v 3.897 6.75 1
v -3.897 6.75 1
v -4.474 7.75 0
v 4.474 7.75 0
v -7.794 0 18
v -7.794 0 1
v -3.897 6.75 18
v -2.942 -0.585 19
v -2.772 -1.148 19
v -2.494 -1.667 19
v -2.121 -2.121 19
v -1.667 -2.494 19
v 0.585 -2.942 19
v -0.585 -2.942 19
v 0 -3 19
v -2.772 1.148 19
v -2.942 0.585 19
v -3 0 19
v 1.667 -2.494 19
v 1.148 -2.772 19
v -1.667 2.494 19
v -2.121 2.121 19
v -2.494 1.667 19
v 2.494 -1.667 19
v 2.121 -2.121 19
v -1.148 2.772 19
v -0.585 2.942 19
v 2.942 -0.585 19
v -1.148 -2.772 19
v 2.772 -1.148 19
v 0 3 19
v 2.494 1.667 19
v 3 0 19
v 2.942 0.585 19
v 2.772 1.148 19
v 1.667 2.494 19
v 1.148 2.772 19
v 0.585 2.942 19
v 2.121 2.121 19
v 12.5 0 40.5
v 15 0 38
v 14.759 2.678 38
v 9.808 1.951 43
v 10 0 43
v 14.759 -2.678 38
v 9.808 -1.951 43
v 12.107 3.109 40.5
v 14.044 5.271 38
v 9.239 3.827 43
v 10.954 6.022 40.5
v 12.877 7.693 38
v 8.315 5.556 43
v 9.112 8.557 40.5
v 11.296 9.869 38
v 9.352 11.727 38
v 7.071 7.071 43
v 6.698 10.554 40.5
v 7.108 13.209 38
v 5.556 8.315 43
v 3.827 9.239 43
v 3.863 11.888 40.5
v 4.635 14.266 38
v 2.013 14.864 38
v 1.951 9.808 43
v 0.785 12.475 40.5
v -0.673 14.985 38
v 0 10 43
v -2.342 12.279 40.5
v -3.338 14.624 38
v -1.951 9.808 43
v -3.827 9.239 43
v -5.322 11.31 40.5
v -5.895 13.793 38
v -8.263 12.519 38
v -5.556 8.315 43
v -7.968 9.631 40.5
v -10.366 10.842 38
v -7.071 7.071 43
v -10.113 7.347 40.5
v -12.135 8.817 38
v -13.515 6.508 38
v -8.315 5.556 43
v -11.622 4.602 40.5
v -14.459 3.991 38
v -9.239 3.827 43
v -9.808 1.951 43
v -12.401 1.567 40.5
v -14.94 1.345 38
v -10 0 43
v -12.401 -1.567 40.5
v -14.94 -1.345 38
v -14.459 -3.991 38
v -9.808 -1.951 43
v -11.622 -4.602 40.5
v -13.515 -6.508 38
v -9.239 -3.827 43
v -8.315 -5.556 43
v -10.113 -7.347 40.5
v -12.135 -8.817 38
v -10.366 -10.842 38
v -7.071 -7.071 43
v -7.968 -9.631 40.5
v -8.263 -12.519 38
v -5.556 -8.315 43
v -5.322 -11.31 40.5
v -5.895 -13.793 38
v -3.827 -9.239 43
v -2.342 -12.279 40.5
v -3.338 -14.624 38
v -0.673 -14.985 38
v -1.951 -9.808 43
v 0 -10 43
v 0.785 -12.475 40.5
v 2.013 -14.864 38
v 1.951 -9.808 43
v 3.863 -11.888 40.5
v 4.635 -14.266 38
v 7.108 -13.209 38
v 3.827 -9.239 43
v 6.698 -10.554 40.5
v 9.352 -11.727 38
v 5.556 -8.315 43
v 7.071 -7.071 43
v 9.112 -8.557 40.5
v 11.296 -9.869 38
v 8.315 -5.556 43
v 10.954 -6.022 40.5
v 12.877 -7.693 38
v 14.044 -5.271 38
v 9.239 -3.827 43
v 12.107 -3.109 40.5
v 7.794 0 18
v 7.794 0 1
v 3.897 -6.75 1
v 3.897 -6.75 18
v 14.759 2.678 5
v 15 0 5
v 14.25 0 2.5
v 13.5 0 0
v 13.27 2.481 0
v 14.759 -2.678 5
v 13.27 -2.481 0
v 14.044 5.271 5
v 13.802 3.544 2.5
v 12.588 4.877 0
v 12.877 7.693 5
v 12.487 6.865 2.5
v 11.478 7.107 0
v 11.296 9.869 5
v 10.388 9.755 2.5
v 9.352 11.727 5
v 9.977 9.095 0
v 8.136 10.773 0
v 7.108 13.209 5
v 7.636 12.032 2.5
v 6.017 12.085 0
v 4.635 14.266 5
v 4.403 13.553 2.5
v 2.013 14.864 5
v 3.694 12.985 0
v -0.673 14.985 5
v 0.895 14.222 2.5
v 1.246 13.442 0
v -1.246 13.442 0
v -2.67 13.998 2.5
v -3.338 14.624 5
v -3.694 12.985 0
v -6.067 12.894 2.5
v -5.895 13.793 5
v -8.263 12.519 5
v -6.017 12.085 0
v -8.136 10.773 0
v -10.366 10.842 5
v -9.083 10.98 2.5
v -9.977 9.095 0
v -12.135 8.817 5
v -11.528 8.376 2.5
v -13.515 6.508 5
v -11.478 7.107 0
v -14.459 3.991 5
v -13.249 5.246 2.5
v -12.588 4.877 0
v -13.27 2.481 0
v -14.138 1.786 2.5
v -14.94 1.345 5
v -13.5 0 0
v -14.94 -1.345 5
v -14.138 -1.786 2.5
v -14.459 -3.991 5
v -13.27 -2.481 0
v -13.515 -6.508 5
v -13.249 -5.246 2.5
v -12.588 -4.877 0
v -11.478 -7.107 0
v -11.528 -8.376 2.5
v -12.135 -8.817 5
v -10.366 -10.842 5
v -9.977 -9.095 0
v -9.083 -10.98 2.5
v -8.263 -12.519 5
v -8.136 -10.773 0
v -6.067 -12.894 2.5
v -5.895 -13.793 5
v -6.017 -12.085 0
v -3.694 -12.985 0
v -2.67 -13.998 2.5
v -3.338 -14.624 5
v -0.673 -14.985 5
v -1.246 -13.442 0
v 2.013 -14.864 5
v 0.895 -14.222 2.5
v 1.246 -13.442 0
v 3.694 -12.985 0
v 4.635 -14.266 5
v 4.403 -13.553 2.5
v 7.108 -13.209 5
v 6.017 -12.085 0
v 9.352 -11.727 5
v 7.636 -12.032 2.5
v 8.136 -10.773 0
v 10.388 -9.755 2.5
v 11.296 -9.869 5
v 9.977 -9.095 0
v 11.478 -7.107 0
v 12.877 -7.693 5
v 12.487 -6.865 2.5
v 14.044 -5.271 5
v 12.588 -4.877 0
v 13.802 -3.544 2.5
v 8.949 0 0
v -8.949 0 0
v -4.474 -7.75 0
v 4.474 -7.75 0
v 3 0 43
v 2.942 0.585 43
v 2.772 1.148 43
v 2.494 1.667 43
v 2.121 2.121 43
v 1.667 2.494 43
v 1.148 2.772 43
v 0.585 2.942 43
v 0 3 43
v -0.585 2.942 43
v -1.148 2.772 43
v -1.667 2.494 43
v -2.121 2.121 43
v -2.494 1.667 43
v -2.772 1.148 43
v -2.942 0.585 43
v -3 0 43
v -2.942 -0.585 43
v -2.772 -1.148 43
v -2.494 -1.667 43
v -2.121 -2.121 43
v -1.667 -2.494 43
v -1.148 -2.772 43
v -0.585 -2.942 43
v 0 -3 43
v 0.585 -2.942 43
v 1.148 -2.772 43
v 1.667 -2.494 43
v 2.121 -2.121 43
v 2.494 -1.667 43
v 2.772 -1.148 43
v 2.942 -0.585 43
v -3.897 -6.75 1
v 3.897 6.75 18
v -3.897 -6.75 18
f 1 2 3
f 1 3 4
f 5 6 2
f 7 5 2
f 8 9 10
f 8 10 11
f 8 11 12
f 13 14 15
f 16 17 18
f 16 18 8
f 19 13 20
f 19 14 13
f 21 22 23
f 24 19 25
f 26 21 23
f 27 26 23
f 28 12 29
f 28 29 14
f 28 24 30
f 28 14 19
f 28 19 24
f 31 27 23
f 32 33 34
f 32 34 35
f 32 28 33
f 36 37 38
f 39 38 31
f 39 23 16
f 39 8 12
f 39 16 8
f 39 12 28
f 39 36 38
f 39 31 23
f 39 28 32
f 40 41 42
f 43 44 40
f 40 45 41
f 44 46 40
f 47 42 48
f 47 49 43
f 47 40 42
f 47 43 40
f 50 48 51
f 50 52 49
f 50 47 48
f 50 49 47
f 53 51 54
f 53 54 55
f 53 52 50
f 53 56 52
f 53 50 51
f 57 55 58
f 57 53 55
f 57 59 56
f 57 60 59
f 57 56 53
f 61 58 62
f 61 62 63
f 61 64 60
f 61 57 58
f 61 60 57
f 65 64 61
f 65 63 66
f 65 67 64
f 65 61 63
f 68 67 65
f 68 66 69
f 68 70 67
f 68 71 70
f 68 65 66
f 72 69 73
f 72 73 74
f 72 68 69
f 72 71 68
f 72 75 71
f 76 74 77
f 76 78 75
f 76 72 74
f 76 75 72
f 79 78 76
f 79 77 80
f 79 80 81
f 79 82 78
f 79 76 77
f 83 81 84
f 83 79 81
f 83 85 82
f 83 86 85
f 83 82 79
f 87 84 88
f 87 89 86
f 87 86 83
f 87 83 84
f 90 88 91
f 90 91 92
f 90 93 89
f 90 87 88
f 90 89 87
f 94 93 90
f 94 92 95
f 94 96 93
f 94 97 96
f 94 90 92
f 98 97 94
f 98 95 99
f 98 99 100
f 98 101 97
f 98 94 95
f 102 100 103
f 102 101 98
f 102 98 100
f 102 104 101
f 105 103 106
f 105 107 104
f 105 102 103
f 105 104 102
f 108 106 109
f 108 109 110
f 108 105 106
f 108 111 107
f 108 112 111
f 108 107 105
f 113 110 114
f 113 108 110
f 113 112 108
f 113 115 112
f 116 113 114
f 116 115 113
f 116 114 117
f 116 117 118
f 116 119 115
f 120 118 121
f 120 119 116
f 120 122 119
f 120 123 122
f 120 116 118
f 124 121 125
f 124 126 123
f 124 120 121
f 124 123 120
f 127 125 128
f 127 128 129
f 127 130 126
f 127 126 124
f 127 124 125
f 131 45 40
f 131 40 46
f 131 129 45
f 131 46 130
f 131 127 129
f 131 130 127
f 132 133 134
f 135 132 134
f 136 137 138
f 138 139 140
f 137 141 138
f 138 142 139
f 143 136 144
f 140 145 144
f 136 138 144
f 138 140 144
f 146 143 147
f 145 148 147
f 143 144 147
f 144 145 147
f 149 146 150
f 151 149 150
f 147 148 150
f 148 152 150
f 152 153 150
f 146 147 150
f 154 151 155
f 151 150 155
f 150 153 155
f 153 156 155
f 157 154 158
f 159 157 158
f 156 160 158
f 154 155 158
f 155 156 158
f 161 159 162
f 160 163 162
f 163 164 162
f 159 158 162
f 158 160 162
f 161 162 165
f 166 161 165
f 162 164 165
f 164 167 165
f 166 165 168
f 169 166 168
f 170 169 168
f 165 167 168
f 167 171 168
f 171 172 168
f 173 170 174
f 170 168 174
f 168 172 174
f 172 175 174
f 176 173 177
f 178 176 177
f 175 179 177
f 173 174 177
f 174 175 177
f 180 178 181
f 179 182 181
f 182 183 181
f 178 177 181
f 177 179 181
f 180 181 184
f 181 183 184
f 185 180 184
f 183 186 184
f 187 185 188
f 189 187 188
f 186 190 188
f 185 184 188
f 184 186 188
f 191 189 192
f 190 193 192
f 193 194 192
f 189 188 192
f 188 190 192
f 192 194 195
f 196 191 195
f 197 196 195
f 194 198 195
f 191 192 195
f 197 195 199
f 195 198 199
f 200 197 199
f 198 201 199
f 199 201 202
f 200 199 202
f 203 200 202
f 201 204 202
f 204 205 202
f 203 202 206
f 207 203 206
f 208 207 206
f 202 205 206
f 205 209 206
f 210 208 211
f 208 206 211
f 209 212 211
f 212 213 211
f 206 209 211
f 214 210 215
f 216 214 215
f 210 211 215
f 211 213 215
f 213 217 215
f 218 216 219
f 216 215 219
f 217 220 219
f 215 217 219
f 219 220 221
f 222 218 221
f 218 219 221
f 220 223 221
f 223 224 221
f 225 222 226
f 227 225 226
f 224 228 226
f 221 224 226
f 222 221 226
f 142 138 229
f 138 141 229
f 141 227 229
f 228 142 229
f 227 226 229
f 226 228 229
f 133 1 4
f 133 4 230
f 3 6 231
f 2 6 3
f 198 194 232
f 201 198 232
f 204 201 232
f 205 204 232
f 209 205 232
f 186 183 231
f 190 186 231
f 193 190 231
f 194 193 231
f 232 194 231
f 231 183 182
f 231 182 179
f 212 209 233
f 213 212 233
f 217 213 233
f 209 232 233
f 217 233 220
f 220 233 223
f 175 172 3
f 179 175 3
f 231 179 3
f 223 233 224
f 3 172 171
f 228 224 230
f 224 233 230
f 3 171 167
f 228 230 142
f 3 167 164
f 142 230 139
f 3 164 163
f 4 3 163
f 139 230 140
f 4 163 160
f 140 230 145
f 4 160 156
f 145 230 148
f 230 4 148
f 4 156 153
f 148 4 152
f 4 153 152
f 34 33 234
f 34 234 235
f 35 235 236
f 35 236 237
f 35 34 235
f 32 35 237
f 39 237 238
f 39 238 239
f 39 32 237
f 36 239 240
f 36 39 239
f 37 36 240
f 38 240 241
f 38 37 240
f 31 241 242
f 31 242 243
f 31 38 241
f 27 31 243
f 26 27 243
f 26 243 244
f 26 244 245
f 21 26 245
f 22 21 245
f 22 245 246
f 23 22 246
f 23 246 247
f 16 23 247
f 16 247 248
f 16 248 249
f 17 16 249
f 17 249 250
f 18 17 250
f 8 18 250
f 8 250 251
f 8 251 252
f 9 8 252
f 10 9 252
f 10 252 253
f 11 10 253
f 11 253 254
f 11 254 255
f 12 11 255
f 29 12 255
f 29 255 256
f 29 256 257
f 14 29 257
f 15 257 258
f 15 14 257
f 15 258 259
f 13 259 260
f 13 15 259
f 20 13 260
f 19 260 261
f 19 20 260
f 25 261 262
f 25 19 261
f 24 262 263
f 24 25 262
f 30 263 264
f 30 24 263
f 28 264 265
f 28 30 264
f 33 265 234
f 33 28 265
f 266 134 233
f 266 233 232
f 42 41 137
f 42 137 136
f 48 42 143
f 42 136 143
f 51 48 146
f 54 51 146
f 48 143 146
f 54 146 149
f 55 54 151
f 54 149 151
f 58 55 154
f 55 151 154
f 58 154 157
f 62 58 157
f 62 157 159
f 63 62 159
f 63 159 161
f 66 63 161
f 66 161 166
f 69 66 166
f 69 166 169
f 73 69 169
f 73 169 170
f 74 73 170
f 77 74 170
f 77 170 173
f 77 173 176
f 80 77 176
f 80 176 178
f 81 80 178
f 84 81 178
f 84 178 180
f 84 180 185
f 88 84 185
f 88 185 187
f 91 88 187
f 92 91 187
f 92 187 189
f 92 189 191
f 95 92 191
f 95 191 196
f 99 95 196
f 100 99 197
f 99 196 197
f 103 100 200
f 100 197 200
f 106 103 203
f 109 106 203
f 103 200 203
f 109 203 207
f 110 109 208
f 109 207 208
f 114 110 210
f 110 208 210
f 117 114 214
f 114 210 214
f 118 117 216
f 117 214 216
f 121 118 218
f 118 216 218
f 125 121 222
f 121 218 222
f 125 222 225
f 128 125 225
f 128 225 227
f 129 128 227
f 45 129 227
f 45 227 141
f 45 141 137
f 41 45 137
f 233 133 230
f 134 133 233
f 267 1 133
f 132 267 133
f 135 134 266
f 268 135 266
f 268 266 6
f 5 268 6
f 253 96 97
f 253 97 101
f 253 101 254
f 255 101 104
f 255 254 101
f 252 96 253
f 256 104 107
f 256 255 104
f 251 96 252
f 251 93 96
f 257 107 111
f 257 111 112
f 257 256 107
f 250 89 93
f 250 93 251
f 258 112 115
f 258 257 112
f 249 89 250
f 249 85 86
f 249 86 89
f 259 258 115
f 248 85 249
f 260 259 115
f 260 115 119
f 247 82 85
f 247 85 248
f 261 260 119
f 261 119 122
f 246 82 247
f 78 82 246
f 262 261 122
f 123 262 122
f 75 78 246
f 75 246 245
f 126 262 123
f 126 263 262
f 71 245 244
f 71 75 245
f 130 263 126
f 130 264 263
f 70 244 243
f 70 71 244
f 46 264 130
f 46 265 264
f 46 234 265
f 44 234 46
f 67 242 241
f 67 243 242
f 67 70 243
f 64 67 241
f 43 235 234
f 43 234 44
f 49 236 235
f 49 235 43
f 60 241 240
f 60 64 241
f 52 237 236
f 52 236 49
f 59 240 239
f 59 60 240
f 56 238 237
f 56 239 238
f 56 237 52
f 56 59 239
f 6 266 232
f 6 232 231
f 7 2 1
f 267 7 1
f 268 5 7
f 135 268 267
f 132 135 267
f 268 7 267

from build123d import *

# Parameters (mm, degrees)
F0_R     = 15
F1_DEPTH = 18
F2_R     = 15
F2_R_2   = 3
F3_DEPTH = 25
F4_SIZE  = 5
F5_SIZE  = 1
F6_DEPTH = 1
F7_SIZE2 = 1.5
F7_SIZE  = 5


with BuildPart() as f1:
    # F0 (on Top) → F1 (new body)
    with BuildSketch(Plane.XY):
        Circle(F0_R)
        Polygon((-7.7942286341, 0), (-3.897114317, 6.75), (3.897114317, 6.75), (7.7942286341, 0), (3.897114317, -6.75), (-3.897114317, -6.75), align=None, mode=Mode.SUBTRACT)
    extrude(amount=F1_DEPTH)

    # F2 (on face) → F3 (join)
    with BuildSketch(Plane.XY.offset(18)):
        Circle(F2_R)
        Polygon((-3.897114317, -6.75), (-7.7942286341, 0), (-3.897114317, 6.75), (3.897114317, 6.75), (7.7942286341, 0), (3.897114317, -6.75), align=None, mode=Mode.SUBTRACT)
        Polygon((-3.897114317, 6.75), (-7.7942286341, 0), (-3.897114317, -6.75), (3.897114317, -6.75), (7.7942286341, 0), (3.897114317, 6.75), align=None)
        Circle(F2_R_2, mode=Mode.SUBTRACT)
    extrude(amount=F3_DEPTH)

    # F4
    f4_edges = [f1.edges().sort_by_distance(p)[0] for p in [
        (-15, 0, 43),
    ]]
    chamfer(f4_edges, length=F4_SIZE)

    # F5
    f5_edges = [f1.edges().sort_by_distance(p)[0] for p in [
        (0, -6.75, 0),
        (5.845671, -3.375, 0),
        (5.845671, 3.375, 0),
        (0, 6.75, 0),
        (-5.845671, 3.375, 0),
        (-5.845671, -3.375, 0),
    ]]
    chamfer(f5_edges, length=F5_SIZE)

    # F2 (on face) → F6 (join)
    with BuildSketch(Plane.XY.offset(18)):
        Circle(F2_R_2)
    extrude(amount=F6_DEPTH)

    # F7
    f7_edges = [f1.edges().sort_by_distance(p)[0] for p in [
        (-15, 0, 0),
    ]]
    f7_side = f1.faces().sort_by_distance((-15, 0, 19))[0]
    chamfer(f7_edges, length=F7_SIZE, length2=F7_SIZE2, reference=f7_side)


solid = f1.part
